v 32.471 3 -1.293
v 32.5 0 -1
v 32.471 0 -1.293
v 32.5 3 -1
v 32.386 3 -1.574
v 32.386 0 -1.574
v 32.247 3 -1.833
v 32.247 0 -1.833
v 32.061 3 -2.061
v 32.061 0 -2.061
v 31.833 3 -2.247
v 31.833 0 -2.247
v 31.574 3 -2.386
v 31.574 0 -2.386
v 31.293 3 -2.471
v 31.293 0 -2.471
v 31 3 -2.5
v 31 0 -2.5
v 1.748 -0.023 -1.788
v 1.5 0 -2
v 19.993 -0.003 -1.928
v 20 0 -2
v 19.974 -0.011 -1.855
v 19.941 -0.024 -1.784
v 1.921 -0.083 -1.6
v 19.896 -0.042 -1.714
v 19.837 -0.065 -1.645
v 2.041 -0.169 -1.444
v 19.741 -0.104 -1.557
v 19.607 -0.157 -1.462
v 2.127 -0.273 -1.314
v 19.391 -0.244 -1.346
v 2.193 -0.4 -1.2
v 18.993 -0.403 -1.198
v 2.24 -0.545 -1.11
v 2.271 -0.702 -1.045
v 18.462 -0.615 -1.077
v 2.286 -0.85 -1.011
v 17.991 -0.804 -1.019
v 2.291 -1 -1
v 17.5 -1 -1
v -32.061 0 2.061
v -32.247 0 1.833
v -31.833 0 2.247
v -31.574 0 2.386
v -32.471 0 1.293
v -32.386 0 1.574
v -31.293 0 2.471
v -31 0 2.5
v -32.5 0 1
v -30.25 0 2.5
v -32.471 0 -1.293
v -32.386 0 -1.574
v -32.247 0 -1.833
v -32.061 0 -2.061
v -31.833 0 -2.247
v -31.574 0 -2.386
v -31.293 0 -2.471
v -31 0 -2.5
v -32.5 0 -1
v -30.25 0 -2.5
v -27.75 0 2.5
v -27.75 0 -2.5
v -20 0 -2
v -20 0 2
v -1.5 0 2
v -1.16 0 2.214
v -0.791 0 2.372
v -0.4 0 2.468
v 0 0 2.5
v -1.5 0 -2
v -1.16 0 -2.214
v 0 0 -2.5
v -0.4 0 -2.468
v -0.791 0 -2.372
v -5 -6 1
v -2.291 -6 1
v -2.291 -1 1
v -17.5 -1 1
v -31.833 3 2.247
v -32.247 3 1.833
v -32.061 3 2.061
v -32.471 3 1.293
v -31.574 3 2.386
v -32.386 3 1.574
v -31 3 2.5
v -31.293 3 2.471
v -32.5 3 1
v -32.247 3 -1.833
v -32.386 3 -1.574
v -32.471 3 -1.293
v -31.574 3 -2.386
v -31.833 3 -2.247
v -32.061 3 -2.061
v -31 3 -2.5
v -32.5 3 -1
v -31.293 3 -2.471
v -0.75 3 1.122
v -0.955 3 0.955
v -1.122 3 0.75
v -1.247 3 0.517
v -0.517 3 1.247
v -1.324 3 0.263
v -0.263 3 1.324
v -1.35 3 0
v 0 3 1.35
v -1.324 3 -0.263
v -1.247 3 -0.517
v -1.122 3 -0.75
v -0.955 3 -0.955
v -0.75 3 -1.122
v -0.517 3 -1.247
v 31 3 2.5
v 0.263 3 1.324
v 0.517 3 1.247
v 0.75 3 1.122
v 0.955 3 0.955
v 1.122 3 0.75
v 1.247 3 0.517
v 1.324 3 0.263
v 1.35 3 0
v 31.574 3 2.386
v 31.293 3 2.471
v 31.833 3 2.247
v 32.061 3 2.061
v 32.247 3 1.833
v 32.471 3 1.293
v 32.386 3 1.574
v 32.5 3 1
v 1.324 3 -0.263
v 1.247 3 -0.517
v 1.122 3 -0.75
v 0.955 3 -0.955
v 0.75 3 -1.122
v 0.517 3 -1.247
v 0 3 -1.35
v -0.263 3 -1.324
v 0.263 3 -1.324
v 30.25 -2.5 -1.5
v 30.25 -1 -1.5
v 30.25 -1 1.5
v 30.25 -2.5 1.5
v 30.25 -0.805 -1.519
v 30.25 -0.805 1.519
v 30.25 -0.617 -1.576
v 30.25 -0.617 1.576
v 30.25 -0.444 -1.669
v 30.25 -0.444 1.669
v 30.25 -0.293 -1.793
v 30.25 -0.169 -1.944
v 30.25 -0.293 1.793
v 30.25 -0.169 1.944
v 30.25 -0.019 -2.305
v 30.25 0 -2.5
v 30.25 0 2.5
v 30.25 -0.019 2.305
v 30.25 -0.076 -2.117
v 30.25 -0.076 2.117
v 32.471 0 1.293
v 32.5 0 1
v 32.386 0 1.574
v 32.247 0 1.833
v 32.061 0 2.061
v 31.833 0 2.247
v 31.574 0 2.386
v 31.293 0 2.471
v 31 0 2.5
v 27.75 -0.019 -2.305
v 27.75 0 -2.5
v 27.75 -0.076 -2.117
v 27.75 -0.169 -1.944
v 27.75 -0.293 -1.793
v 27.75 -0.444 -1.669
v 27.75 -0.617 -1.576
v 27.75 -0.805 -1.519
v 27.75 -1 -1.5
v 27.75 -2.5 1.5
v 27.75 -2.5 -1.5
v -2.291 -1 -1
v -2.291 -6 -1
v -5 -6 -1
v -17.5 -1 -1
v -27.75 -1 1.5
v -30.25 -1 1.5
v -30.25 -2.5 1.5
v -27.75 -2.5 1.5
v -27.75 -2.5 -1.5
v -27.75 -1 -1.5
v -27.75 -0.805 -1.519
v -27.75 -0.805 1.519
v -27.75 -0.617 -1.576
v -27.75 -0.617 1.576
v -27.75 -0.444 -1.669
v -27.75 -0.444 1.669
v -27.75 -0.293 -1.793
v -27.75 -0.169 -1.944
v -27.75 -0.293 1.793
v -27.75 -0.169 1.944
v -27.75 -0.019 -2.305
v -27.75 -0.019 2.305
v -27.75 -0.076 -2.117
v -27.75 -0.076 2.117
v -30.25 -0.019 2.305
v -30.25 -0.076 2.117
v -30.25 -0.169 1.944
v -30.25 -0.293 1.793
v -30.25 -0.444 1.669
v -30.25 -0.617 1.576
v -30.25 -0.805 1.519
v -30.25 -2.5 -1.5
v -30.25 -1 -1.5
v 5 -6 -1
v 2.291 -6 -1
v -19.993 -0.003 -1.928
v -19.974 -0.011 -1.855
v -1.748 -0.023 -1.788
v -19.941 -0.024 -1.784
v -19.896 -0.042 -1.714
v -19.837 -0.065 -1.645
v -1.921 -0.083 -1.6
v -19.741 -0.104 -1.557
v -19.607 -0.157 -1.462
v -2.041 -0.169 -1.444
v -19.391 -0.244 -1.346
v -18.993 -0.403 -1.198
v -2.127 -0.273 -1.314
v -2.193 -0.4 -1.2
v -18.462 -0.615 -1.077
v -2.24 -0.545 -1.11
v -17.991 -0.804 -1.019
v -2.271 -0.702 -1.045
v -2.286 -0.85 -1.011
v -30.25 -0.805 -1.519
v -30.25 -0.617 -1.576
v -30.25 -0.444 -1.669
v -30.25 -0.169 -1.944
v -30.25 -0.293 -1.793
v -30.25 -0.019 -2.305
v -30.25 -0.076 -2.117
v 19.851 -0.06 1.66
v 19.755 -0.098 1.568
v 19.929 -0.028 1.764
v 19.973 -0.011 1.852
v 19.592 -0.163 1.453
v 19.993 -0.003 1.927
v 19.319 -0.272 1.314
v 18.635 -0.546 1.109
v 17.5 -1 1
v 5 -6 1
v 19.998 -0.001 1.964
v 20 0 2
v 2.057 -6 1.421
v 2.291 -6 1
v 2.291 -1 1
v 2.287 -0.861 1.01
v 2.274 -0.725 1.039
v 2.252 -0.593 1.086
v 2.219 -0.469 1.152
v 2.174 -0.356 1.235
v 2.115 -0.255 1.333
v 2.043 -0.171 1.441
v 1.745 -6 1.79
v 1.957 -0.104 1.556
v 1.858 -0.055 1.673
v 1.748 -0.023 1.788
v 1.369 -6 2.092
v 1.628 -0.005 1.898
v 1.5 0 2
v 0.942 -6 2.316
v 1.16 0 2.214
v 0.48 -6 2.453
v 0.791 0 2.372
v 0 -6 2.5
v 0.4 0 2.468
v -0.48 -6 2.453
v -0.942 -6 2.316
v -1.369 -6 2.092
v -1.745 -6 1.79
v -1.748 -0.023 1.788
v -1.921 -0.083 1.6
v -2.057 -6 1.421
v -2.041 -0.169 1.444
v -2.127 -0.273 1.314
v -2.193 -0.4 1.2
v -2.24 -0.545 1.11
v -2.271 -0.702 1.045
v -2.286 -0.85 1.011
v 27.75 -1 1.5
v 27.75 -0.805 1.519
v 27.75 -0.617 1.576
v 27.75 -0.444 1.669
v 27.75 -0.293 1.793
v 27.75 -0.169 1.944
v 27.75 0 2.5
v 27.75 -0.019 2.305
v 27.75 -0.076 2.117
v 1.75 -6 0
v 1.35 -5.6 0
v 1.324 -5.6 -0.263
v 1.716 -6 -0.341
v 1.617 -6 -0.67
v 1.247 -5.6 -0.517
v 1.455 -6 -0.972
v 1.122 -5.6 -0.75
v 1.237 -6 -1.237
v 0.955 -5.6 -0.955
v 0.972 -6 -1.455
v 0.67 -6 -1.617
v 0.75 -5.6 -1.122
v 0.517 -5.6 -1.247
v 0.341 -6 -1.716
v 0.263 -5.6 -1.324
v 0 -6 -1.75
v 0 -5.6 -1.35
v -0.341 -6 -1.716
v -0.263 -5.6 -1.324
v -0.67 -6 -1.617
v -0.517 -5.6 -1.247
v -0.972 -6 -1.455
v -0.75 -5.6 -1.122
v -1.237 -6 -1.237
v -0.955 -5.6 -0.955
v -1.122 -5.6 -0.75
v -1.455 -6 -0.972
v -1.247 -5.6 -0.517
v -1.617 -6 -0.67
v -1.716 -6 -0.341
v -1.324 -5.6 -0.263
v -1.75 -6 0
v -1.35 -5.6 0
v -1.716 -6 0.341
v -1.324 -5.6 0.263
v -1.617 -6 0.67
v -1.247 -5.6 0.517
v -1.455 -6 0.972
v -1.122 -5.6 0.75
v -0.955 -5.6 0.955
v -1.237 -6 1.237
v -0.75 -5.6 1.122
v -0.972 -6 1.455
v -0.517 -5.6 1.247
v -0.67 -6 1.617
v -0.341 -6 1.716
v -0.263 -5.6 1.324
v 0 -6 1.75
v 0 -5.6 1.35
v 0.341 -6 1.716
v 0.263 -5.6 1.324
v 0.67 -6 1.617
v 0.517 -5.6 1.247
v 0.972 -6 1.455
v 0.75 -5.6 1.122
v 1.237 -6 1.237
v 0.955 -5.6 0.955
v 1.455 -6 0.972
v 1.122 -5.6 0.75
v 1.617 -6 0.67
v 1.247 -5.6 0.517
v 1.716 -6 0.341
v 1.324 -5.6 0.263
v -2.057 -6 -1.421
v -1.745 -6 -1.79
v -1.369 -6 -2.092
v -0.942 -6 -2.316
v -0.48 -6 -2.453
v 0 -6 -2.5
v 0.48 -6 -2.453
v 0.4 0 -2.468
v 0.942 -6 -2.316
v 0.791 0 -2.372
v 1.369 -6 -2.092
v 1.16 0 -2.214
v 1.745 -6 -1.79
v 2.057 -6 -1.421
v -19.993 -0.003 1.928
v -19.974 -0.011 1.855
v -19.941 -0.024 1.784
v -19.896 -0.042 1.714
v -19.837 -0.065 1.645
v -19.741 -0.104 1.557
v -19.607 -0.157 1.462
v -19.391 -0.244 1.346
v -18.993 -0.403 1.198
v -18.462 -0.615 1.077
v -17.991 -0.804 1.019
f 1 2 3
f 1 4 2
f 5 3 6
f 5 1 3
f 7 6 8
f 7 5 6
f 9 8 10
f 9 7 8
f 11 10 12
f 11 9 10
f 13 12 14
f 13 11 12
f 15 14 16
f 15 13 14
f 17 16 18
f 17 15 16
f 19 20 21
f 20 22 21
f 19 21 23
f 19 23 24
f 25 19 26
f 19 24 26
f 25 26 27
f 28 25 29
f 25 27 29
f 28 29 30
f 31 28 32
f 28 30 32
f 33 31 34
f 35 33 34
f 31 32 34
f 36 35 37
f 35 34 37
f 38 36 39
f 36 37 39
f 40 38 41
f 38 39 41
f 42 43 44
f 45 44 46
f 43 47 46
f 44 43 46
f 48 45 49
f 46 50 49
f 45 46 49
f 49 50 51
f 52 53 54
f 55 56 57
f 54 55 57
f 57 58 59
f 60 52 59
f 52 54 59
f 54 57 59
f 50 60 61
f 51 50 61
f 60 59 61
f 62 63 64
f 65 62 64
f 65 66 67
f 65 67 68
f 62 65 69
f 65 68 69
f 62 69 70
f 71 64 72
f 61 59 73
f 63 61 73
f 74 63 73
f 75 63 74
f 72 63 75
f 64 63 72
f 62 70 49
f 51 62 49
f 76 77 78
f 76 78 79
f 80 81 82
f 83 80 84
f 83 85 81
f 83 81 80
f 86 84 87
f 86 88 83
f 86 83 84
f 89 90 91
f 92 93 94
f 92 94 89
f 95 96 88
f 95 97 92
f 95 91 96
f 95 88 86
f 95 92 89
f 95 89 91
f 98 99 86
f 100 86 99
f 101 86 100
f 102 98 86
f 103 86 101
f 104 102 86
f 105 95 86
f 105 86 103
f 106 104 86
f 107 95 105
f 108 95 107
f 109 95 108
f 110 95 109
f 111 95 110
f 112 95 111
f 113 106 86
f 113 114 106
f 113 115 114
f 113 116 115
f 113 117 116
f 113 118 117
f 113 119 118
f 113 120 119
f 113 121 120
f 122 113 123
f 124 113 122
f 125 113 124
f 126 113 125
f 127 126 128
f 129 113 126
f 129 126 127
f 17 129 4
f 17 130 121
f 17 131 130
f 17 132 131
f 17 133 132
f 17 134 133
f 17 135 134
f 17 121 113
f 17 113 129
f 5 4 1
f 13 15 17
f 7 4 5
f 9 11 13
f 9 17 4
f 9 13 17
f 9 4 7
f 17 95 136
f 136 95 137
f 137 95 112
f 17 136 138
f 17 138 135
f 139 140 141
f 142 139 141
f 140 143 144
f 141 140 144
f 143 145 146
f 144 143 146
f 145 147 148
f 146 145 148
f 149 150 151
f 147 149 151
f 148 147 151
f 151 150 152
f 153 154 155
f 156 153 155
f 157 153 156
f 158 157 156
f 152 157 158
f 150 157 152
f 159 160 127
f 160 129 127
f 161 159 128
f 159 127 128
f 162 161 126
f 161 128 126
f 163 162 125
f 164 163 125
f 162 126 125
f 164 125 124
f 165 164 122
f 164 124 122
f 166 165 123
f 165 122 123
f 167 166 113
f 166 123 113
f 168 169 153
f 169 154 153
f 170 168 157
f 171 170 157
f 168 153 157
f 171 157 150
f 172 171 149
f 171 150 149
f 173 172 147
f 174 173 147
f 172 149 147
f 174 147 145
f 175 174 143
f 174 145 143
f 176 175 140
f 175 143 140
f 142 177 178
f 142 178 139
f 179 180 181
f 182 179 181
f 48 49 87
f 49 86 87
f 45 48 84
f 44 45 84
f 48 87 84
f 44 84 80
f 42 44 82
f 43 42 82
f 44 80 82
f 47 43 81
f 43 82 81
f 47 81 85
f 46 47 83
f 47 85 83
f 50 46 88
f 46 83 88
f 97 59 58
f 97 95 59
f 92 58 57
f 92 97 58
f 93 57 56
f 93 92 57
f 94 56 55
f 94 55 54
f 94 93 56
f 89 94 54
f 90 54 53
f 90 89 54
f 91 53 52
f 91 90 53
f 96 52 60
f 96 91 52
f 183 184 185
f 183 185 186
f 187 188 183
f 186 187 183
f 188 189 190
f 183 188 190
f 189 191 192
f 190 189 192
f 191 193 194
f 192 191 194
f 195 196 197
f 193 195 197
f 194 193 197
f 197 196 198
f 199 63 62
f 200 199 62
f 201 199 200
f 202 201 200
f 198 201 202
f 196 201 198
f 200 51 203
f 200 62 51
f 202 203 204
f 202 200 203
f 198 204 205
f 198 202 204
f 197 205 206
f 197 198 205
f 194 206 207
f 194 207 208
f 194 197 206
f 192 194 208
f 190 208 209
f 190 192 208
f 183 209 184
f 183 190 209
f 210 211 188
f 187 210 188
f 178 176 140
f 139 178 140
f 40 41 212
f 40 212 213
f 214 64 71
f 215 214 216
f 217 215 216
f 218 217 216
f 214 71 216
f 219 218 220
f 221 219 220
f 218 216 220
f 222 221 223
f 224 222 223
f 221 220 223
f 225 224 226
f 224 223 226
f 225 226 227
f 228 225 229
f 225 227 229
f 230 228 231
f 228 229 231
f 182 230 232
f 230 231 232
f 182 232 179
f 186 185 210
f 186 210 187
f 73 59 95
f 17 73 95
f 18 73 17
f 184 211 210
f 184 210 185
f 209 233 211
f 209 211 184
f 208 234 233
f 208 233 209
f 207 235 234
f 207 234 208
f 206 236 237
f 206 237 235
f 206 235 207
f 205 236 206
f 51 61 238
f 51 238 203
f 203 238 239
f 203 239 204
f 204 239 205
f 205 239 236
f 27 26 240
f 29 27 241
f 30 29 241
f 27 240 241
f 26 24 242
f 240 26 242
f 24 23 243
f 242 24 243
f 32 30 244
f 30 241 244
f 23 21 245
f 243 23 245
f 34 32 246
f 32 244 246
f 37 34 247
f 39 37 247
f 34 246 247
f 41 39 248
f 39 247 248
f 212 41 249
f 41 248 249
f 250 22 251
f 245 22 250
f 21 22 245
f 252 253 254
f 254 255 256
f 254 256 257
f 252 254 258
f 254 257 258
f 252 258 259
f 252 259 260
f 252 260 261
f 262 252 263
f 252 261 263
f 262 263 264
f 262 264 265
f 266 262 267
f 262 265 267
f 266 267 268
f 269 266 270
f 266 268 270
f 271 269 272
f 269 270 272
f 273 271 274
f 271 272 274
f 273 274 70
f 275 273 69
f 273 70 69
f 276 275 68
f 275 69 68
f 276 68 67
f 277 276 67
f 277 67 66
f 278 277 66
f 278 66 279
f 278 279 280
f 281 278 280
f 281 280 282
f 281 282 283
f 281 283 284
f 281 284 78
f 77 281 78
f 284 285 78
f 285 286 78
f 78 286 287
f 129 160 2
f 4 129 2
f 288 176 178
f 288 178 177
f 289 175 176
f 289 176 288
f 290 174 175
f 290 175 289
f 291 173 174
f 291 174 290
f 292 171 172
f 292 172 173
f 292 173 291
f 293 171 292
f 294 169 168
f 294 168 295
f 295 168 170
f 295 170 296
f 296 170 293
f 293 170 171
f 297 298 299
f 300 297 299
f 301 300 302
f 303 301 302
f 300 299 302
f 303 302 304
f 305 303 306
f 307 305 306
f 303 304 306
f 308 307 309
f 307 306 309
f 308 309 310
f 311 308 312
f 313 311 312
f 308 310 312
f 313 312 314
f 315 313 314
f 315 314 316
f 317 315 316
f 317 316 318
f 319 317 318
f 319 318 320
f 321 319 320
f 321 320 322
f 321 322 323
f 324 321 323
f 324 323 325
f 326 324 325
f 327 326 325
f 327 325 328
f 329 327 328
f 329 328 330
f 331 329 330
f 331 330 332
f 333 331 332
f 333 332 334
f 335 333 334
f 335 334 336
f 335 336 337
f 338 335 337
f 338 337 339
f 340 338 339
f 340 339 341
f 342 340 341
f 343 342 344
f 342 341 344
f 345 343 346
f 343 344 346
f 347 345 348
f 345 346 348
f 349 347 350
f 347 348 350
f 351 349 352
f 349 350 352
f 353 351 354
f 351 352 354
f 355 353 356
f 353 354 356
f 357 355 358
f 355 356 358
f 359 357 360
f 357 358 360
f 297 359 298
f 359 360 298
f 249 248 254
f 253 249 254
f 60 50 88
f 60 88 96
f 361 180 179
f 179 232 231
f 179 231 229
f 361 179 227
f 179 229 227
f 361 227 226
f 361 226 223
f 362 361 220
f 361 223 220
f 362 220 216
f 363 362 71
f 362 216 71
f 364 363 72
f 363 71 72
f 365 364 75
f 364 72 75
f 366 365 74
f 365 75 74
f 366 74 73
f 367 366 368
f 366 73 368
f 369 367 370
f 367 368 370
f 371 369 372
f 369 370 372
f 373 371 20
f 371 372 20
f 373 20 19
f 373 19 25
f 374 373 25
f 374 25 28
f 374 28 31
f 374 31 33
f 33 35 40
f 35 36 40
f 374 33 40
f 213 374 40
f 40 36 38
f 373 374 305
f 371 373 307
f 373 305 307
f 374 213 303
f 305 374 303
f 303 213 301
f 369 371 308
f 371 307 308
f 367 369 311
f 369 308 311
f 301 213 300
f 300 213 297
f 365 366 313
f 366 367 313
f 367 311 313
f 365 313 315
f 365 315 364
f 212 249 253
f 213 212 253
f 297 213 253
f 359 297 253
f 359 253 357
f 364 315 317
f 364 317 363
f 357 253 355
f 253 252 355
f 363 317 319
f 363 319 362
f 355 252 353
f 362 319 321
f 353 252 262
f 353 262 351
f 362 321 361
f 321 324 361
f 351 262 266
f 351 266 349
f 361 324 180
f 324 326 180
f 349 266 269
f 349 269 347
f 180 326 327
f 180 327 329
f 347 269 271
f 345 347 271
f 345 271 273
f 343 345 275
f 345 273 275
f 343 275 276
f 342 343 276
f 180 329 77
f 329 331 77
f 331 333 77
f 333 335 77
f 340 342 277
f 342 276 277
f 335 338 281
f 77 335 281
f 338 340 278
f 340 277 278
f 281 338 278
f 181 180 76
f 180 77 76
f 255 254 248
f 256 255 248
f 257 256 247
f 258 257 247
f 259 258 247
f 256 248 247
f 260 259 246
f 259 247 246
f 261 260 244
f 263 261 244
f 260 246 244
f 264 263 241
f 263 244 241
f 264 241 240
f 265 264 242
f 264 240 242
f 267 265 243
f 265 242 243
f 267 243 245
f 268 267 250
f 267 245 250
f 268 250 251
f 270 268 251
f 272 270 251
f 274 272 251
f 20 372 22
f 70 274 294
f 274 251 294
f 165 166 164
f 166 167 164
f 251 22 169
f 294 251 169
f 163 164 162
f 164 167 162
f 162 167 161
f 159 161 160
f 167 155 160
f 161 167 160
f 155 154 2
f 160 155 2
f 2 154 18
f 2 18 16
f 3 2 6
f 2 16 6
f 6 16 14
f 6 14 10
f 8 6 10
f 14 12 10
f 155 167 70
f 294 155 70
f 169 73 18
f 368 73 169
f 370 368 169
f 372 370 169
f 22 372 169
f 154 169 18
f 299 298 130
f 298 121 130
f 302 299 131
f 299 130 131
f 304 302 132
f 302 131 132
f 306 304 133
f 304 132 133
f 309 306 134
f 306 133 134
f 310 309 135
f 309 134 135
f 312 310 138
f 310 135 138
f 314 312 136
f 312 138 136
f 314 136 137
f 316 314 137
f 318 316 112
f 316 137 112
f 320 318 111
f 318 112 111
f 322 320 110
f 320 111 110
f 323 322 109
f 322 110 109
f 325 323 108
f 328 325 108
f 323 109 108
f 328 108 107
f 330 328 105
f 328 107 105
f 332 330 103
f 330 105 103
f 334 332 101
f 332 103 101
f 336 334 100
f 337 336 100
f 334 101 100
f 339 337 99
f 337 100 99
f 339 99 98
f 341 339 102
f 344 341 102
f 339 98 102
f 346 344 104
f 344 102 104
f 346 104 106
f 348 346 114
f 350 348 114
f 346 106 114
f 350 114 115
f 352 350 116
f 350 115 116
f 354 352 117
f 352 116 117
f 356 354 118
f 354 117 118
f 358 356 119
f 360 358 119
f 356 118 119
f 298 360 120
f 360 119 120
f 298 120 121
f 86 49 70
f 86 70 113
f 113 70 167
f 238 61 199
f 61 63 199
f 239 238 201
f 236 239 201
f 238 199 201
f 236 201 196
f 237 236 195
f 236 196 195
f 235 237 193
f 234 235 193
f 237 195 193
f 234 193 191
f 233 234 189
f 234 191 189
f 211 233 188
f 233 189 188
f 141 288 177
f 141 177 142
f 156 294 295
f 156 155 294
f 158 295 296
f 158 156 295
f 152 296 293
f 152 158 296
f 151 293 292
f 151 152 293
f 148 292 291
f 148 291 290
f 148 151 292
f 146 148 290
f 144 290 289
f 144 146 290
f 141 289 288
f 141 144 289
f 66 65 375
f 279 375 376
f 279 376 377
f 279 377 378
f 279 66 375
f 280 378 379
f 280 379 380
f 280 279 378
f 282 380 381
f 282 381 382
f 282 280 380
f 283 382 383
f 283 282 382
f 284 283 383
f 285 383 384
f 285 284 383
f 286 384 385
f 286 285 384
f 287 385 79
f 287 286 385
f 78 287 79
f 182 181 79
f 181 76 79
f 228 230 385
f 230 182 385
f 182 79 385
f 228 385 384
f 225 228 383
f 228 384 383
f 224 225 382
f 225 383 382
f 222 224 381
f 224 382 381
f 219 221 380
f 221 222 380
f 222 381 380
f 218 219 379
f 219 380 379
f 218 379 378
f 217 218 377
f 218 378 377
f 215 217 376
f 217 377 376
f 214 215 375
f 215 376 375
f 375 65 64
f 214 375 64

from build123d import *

# Parameters (mm, degrees)
SKETCH1_W                        = 65
SKETCH1_H                        = 5
BODY_DEPTH                       = 3
SKETCH3_W                        = 2.5
SKETCH3_H                        = 3
PEGS_DEPTH                       = 2.5
WEB_DEPTH                        = 1
SKETCH6_R                        = 2.5
HOLE_BOSS_DEPTH                  = 6
M2_5_CLEARANCE_HOLE1_D           = 2.7
M2_5_CLEARANCE_HOLE1_CSINK_D     = 3.5
M2_5_CLEARANCE_HOLE1_CSINK_ANGLE = 90
FILLET1_R                        = 1.5
FILLET2_R                        = 1
FILLET3_R                        = 1


with BuildPart() as part:
    # Sketch1 → body (new body)
    with BuildSketch(Plane(origin=(0, 0, 0), x_dir=(1, 0, 0), z_dir=(0, 1, 0))):
        Rectangle(SKETCH1_W, SKETCH1_H)
    extrude(amount=BODY_DEPTH)

    # Sketch3 → pegs (add)
    with BuildSketch(Plane.XZ):
        with Locations((29, 0)):
            Rectangle(SKETCH3_W, SKETCH3_H)
        with Locations((-29, 0)):
            Rectangle(SKETCH3_W, SKETCH3_H)
    extrude(amount=PEGS_DEPTH)

    # Sketch5 → web (add, symmetric)
    with BuildSketch(Plane.XY):
        Polygon((-20, 0), (20, 0), (5, -6), (-5, -6), align=None)
    extrude(amount=WEB_DEPTH, both=True)

    # Sketch6 → hole-boss (add)
    with BuildSketch(Plane.XZ):
        Circle(SKETCH6_R)
    extrude(amount=HOLE_BOSS_DEPTH)

    # M2.5 Clearance Hole1 (through all)
    with Locations(Plane(origin=(0, -6, 0), x_dir=(-1, 0, 0), z_dir=(0, -1, 0))):
        with Locations((0, 0)):
            CounterSinkHole(M2_5_CLEARANCE_HOLE1_D / 2, M2_5_CLEARANCE_HOLE1_CSINK_D / 2, counter_sink_angle=M2_5_CLEARANCE_HOLE1_CSINK_ANGLE)

    # Fillet1
    fillet1_edges = [part.edges().sort_by_distance(p)[0] for p in [
        (32.5, 1.5, 2.5),
        (-32.5, 1.5, 2.5),
        (-32.5, 1.5, -2.5),
        (32.5, 1.5, -2.5),
    ]]
    fillet(fillet1_edges, radius=FILLET1_R)

    # Fillet2
    fillet2_edges = [part.edges().sort_by_distance(p)[0] for p in [
        (29, 0, 1.5),
        (29, 0, -1.5),
        (-29, 0, 1.5),
        (-29, 0, -1.5),
    ]]
    fillet(fillet2_edges, radius=FILLET2_R - 0.0001)  # a hair under: the kernel refuses the full size

    # Fillet3
    fillet3_edges = [part.edges().sort_by_distance(p)[0] for p in [
        (11.145643924, 0, -1),
        (11.145643924, 0, 1),
        (-11.145643924, 0, -1),
        (-11.145643924, 0, 1),
    ]]
    fillet(fillet3_edges, radius=FILLET3_R)


solid = part.part
